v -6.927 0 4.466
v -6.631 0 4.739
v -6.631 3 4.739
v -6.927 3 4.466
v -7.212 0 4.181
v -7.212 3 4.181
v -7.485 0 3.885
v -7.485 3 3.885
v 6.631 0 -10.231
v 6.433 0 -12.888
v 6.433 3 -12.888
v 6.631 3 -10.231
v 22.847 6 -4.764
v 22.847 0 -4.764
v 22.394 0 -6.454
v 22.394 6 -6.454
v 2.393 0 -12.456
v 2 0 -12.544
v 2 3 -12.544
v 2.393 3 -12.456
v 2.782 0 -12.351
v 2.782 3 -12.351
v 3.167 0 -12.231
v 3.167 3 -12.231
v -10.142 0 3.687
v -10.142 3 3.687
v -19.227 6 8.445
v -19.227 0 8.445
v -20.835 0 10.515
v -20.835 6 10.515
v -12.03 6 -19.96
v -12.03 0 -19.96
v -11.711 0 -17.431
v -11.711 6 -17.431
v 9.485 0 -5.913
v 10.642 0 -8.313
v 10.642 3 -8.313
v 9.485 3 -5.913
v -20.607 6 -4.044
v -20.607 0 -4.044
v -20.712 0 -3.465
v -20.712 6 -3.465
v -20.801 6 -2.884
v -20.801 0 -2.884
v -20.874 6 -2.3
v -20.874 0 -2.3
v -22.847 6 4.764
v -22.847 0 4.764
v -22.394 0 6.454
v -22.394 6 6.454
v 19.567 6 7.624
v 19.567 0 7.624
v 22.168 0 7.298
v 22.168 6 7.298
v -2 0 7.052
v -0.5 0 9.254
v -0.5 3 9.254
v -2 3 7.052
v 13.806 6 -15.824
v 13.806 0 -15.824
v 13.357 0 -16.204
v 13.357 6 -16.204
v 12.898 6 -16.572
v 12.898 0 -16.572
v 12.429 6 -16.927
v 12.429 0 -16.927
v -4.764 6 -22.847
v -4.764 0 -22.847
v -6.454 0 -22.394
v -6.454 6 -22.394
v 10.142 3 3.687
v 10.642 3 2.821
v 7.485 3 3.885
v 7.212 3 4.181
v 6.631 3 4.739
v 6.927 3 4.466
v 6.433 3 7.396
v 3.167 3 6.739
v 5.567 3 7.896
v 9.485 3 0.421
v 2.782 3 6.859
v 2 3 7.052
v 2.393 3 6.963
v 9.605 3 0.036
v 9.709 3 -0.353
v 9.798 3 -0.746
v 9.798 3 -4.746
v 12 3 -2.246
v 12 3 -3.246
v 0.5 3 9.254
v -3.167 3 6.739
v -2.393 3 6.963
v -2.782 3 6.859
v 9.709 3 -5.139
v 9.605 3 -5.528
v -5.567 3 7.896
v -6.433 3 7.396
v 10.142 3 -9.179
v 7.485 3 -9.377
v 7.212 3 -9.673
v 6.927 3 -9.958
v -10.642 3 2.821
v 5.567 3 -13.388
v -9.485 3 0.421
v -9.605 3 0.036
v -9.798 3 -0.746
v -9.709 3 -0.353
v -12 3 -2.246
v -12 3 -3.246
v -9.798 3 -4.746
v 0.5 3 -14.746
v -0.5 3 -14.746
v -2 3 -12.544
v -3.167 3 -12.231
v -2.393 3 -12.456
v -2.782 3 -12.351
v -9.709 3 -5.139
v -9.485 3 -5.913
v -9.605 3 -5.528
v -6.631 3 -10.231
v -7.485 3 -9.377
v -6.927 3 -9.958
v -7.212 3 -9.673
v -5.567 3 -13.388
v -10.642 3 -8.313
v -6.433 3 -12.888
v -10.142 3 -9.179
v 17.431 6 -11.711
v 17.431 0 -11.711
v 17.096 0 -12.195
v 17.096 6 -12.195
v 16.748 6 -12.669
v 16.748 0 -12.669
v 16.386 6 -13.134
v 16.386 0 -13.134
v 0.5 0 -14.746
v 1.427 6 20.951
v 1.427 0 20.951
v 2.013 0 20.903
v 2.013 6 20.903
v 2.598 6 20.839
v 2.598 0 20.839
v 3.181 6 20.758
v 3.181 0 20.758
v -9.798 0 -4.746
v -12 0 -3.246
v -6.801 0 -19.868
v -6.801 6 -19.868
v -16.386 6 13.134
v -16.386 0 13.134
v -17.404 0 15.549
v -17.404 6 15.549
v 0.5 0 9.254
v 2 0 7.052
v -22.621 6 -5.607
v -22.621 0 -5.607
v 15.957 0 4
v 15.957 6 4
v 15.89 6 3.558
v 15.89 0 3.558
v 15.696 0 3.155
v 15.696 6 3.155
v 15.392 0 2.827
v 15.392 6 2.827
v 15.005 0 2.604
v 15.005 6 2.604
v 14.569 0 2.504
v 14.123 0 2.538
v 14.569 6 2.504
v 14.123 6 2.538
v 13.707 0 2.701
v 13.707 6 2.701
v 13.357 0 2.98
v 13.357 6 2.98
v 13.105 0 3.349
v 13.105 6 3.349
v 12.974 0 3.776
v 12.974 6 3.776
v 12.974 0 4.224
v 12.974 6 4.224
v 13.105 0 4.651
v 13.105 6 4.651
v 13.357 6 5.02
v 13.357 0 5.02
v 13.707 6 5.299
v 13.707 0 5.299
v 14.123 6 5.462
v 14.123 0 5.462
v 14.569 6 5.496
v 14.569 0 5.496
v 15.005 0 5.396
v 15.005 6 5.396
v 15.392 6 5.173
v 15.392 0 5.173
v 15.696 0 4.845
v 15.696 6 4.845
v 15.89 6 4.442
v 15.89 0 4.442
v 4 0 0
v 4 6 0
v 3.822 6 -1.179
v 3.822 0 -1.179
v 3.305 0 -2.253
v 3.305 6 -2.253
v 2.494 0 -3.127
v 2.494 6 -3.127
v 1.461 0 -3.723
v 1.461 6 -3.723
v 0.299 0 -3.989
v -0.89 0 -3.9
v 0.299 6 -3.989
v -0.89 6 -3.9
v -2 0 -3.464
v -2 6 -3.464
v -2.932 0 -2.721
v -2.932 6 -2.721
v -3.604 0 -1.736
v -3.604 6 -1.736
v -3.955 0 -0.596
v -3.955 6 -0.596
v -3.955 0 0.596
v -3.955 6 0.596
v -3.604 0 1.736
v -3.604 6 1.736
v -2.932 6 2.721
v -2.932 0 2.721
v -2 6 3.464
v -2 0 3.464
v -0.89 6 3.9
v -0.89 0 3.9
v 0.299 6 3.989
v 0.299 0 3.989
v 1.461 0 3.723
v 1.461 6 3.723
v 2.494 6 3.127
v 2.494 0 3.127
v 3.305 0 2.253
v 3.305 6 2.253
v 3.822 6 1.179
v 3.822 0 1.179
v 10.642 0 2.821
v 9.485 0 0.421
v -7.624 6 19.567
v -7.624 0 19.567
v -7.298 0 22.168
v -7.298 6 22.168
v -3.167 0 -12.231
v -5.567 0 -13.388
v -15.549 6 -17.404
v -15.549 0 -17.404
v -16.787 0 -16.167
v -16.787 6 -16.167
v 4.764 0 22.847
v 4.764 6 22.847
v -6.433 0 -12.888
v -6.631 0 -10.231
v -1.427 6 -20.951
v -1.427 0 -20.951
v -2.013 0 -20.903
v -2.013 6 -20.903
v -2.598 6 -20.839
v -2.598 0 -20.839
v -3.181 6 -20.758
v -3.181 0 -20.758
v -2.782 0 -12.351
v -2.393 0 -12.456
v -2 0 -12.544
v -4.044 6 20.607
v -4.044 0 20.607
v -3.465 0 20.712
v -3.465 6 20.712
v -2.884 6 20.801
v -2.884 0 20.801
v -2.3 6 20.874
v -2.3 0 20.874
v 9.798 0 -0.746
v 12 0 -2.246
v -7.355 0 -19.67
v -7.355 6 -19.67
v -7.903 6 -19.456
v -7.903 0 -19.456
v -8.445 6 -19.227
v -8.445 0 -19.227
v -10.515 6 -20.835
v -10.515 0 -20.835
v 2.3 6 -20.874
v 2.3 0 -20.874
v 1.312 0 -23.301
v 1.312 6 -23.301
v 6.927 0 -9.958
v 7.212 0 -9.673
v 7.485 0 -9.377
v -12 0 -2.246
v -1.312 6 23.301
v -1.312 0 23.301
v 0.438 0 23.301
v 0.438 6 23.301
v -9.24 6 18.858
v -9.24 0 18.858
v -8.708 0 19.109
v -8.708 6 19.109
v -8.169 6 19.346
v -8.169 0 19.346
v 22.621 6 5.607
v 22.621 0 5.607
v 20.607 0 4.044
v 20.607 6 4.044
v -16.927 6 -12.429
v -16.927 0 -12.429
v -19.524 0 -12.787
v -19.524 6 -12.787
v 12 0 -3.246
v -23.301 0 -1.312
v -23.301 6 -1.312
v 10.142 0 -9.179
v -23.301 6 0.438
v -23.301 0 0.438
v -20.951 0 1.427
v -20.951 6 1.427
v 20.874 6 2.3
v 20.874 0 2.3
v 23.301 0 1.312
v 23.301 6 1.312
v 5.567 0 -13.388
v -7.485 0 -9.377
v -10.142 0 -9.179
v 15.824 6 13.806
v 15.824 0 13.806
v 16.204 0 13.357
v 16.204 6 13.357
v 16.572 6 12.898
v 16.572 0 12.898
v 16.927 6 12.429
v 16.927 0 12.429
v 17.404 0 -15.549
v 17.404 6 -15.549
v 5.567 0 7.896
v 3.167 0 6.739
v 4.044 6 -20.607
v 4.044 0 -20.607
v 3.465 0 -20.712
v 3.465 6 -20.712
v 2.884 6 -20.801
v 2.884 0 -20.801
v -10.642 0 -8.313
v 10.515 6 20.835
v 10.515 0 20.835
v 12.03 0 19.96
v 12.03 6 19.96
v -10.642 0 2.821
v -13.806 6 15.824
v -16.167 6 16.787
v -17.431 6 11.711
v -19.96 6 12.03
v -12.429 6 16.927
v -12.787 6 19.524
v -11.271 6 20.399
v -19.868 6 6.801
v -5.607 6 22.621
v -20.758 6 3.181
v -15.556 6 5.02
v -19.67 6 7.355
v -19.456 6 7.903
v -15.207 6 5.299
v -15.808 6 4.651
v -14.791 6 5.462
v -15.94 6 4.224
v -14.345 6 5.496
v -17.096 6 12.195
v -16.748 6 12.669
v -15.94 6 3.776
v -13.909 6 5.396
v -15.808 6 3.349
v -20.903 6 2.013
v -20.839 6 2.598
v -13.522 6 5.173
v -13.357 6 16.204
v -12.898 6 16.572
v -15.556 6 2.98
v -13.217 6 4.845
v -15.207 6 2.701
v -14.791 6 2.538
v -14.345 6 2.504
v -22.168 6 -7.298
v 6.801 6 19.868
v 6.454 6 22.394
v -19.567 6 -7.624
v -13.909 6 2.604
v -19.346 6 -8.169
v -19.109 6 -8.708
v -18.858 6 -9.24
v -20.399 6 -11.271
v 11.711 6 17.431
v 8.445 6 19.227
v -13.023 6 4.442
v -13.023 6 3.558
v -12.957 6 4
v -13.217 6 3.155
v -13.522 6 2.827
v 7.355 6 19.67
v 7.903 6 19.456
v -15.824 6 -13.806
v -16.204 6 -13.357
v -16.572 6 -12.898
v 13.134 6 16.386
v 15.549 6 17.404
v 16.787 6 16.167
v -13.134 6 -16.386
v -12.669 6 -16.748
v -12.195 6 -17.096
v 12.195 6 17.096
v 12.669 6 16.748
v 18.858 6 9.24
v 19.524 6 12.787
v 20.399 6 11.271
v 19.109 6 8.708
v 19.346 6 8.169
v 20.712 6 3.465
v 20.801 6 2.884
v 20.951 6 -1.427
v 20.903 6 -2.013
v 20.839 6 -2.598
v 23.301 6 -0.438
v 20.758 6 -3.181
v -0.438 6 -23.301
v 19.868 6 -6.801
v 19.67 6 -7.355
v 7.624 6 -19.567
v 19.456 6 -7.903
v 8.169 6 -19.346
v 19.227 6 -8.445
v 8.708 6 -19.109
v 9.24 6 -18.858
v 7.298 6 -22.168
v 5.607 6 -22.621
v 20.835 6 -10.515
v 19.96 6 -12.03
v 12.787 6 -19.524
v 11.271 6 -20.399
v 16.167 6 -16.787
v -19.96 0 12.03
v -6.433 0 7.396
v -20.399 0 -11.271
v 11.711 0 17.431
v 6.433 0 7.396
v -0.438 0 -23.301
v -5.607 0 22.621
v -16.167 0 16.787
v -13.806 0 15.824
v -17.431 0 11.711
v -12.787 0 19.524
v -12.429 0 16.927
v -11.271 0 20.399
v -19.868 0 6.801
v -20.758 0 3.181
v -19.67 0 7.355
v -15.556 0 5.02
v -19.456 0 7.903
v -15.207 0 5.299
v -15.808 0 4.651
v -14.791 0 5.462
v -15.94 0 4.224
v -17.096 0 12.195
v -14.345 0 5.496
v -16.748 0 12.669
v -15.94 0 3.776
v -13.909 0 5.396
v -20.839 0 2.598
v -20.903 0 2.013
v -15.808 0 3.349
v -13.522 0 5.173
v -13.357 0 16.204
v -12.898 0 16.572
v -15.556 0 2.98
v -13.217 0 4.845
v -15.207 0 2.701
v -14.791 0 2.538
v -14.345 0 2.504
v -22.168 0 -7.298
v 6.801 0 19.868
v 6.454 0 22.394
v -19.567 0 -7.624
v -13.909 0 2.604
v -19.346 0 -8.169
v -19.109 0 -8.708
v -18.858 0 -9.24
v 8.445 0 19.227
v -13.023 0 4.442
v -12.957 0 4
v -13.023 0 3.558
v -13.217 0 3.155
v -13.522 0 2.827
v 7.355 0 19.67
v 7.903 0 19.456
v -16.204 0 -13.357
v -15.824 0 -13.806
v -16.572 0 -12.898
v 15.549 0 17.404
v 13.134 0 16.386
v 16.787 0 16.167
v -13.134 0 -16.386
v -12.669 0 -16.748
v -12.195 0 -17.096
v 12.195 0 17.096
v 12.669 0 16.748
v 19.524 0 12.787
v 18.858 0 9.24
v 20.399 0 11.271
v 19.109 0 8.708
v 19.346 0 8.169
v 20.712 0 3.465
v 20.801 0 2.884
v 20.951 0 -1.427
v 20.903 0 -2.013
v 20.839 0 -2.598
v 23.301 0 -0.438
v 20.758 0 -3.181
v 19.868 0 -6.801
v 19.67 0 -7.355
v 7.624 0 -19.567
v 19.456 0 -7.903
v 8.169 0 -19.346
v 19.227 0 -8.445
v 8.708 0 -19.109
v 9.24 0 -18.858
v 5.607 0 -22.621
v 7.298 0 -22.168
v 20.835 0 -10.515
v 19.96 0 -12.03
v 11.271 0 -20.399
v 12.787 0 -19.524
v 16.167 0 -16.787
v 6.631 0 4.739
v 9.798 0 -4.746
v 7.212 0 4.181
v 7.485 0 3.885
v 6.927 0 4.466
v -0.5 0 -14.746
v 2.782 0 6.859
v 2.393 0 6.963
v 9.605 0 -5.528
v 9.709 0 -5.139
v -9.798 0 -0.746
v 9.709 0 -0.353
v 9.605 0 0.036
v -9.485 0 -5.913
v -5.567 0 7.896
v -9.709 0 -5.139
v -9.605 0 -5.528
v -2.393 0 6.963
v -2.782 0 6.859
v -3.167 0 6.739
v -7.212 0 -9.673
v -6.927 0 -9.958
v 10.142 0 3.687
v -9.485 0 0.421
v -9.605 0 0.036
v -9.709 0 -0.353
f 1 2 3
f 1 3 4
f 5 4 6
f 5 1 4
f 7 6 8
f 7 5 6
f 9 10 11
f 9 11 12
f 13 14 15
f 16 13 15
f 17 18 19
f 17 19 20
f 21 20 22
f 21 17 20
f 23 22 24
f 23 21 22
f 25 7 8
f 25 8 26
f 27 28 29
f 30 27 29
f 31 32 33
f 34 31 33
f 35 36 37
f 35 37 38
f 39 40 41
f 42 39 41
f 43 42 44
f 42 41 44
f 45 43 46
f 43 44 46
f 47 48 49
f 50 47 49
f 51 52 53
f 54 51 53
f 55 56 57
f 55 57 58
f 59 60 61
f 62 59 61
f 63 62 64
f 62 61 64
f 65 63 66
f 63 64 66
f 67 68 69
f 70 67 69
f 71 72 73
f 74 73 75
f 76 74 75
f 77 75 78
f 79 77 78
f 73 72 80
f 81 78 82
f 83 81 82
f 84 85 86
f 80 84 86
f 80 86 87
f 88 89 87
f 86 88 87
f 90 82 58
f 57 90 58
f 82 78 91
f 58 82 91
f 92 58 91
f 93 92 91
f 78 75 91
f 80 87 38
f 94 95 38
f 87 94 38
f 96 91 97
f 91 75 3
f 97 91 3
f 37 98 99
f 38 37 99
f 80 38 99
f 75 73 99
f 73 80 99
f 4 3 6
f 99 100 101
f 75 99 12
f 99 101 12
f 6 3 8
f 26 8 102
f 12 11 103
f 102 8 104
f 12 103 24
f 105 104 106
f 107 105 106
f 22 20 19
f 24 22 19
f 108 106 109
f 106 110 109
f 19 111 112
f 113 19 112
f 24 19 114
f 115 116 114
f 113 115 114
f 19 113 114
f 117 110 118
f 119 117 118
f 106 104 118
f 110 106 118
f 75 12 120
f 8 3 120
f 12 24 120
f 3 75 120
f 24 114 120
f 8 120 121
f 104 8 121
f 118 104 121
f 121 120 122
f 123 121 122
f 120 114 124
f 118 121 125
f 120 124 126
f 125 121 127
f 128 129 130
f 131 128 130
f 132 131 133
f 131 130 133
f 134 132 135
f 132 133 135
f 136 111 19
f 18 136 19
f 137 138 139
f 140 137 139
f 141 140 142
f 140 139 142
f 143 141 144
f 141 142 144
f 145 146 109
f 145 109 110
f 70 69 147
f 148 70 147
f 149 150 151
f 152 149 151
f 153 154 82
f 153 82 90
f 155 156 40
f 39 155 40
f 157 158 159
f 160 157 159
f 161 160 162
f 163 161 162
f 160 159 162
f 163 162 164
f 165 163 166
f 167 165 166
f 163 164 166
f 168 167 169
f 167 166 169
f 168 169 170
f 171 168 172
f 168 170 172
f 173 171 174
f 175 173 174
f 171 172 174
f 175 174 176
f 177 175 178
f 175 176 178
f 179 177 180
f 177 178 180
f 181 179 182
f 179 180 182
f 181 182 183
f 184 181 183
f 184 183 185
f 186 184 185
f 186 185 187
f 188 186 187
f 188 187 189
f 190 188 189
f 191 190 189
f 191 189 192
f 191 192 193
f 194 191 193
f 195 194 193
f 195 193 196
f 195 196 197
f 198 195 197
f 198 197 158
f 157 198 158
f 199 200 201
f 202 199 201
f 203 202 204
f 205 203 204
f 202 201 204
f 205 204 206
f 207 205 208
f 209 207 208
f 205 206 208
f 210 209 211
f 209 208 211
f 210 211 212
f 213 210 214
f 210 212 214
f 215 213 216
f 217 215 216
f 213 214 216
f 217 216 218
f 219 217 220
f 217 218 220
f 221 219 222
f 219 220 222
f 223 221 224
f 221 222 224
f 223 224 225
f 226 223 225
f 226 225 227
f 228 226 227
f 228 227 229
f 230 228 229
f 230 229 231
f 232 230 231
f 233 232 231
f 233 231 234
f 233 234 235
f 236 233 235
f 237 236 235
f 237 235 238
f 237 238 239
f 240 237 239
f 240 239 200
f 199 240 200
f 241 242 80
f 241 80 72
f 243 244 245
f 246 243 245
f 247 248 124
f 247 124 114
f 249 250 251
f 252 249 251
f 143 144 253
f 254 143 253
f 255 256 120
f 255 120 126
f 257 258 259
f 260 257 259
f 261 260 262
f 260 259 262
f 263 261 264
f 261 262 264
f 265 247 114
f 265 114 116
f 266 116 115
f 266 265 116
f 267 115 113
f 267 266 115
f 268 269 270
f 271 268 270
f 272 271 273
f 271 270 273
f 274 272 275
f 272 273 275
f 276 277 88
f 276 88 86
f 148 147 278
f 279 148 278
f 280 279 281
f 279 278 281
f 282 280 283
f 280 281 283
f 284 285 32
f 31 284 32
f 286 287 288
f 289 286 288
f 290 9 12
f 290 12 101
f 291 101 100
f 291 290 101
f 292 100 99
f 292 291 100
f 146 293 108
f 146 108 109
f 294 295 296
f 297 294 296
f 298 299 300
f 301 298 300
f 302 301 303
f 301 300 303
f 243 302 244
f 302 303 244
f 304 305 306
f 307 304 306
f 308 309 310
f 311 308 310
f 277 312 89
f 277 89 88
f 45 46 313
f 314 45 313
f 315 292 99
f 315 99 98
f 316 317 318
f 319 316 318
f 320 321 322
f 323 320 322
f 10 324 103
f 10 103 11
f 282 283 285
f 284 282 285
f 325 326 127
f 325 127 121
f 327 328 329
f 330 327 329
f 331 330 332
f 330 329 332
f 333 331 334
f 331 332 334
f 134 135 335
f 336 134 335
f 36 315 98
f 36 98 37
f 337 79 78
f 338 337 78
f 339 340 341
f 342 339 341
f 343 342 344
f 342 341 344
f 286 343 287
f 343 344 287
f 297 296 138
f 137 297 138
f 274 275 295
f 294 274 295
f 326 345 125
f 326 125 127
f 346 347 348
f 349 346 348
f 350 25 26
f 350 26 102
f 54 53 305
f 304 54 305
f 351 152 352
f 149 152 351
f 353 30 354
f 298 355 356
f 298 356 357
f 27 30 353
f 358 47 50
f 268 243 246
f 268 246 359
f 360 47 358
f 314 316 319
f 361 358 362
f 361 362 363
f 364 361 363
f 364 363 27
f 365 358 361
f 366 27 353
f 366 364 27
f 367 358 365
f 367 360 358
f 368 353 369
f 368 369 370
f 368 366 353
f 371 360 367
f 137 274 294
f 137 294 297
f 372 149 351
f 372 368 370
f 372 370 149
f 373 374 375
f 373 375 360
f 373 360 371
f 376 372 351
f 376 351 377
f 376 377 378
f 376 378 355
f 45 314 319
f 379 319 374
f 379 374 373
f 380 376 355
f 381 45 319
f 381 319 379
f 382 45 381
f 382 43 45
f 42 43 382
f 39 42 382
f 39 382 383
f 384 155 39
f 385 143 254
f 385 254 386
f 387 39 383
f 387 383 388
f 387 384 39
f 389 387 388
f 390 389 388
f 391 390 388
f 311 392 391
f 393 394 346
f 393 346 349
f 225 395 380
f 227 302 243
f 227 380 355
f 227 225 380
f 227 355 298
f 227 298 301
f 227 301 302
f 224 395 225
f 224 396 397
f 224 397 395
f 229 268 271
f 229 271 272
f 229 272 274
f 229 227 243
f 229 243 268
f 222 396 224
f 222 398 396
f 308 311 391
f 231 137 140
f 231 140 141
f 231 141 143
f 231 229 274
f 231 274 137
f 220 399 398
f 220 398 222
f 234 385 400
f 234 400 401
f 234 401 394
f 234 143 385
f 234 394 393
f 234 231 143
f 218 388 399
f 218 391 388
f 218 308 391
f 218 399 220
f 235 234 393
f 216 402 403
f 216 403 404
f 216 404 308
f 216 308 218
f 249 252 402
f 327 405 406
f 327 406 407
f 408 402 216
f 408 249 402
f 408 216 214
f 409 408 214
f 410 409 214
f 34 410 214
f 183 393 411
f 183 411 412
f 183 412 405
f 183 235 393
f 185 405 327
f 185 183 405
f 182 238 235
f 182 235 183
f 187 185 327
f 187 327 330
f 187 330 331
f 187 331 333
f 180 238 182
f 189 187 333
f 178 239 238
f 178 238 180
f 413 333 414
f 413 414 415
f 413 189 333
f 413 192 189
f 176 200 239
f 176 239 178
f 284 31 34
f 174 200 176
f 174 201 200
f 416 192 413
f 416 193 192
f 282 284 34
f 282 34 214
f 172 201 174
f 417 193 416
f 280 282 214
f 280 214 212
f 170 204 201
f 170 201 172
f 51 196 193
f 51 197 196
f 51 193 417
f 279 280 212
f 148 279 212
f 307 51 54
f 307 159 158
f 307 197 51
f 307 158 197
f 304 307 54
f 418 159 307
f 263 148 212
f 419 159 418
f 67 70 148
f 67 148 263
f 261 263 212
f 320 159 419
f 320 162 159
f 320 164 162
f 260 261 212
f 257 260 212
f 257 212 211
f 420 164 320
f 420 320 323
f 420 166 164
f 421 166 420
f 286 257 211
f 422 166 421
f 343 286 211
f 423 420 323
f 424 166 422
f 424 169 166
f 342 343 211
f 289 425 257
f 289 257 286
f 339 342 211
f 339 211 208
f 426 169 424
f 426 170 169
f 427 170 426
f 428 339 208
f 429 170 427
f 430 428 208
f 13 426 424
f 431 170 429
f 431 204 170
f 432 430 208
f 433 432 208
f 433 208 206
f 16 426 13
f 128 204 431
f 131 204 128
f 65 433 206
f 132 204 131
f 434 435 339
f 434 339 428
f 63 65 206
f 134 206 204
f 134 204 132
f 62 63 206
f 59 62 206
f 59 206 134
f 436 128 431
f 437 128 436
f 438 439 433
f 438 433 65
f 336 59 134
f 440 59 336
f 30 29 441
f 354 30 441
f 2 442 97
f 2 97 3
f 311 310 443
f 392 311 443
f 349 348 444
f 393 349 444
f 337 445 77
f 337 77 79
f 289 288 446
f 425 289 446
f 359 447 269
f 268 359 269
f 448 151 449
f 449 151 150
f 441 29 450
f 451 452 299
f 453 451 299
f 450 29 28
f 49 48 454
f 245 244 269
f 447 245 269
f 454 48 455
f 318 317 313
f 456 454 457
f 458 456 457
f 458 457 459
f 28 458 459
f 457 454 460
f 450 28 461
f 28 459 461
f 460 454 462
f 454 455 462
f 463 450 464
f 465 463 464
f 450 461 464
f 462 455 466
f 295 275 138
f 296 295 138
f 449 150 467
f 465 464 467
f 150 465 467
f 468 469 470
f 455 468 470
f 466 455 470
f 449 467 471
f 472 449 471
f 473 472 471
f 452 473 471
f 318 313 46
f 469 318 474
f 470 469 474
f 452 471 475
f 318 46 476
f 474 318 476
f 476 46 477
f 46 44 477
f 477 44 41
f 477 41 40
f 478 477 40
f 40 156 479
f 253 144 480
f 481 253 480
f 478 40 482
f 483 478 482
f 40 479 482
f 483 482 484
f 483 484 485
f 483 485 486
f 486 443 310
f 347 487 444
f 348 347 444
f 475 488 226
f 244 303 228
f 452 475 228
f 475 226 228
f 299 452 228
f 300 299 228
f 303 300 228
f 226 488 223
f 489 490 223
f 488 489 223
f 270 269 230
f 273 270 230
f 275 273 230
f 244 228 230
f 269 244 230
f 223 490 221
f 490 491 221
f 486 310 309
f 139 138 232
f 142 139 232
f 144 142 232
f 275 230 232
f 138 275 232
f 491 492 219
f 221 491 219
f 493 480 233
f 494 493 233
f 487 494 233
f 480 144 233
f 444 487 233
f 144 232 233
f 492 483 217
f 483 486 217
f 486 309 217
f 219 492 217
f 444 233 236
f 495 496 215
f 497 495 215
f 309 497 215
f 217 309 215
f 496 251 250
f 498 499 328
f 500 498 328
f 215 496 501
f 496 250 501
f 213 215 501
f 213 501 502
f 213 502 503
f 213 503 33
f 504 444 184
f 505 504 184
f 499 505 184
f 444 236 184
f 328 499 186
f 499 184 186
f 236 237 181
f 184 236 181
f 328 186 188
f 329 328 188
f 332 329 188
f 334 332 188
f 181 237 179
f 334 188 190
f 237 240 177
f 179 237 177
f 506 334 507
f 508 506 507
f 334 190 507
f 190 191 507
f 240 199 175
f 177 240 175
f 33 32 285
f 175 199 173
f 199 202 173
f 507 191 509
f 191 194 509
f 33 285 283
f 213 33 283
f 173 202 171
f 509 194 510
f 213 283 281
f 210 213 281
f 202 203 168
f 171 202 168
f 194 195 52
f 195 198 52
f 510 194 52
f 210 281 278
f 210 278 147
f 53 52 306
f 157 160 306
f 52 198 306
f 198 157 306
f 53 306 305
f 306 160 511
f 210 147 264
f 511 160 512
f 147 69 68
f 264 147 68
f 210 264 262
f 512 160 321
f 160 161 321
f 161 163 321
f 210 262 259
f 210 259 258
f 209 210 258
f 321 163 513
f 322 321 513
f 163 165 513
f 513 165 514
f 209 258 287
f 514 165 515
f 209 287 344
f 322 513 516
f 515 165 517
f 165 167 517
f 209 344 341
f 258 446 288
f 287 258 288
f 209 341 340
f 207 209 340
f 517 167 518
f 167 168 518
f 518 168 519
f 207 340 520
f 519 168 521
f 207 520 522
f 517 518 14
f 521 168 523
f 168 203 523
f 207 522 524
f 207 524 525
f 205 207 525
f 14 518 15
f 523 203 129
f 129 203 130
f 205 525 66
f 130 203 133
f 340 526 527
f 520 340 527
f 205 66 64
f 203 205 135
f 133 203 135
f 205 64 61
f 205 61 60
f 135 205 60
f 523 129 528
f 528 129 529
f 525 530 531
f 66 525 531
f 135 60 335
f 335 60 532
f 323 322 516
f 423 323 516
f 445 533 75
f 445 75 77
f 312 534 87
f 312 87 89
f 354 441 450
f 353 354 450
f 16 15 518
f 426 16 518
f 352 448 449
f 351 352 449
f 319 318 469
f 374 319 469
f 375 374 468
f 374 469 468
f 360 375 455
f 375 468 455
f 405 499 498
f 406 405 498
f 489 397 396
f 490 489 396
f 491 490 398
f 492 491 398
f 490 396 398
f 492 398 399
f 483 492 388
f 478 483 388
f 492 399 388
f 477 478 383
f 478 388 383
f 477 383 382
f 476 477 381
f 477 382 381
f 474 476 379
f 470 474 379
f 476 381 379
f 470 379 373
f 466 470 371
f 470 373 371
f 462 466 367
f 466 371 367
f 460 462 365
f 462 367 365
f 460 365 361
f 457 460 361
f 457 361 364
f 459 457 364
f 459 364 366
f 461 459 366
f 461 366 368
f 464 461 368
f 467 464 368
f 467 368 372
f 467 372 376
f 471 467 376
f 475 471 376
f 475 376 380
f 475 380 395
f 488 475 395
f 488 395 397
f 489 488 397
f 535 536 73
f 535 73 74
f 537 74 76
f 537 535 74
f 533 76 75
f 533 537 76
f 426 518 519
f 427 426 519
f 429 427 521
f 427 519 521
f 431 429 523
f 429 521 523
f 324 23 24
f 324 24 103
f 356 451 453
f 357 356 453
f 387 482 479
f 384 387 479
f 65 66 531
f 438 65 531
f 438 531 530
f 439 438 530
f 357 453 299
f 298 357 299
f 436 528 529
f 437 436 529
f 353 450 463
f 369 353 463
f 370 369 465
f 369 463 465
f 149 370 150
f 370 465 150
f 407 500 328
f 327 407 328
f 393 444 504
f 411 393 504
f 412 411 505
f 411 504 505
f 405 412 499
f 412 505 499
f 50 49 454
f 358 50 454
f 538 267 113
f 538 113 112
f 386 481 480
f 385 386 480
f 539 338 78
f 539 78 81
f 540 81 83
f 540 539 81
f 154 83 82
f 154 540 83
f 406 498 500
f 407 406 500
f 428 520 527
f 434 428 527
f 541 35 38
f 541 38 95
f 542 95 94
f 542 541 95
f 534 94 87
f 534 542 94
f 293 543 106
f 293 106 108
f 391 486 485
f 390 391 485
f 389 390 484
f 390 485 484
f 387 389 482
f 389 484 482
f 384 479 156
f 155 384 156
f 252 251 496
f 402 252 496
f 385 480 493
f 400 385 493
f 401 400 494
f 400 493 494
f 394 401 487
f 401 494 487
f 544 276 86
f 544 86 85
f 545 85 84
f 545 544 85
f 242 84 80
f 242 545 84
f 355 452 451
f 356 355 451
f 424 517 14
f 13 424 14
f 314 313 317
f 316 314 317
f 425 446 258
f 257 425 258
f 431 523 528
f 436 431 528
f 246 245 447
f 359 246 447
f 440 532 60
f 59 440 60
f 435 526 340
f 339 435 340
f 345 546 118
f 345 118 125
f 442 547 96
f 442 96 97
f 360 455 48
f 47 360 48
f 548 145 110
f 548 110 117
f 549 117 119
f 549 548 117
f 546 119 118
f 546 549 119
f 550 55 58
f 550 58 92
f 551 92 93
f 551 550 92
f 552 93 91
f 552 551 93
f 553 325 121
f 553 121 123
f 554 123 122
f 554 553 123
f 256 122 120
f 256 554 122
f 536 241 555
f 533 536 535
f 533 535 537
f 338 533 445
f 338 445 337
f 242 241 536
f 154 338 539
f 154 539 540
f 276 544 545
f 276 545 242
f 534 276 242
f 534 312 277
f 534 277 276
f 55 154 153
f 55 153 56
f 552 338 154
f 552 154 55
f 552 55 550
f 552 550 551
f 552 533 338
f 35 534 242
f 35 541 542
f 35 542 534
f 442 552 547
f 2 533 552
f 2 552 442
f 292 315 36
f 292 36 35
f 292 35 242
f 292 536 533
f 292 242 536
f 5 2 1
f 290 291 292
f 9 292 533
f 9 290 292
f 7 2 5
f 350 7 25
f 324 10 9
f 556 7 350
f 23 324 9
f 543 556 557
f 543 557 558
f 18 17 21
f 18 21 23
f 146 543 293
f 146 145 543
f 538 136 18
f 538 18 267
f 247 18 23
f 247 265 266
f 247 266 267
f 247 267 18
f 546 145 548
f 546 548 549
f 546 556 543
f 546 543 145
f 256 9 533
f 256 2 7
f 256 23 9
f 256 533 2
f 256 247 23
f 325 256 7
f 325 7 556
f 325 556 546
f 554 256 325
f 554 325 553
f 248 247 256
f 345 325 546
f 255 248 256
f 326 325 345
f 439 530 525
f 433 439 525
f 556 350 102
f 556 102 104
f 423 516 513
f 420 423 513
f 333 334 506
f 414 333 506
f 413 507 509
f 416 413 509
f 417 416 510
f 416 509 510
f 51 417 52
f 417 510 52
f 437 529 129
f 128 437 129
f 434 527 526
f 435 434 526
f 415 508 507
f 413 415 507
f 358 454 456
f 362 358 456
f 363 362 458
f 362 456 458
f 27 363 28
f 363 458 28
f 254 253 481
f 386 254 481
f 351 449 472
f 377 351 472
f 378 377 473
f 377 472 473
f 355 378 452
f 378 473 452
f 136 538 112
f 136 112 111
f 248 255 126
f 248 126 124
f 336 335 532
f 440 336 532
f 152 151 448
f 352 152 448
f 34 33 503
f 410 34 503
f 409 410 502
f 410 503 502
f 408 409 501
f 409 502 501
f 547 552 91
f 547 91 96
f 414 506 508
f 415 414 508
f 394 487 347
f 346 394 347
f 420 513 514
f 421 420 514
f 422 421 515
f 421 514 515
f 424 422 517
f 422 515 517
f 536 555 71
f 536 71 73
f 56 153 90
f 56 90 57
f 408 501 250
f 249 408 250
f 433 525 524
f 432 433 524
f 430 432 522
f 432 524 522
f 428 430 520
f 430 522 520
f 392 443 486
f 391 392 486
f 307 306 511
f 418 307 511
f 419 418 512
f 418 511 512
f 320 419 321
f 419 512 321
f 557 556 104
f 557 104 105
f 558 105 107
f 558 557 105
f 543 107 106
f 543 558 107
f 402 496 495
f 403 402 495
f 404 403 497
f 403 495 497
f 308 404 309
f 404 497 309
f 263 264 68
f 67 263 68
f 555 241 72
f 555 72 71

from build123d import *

# Parameters (mm, degrees)
BOSS_EXTRUDE5_DEPTH = 6
BOSS_EXTRUDE6_DEPTH = 3
SKETCH4_R           = 4
CUT_EXTRUDE1_DEPTH  = 10
SKETCH5_R           = 1.5
CUT_EXTRUDE2_DEPTH  = 7


with BuildPart() as part:
    # Sketch3 → Boss-Extrude5 (new body)
    with BuildSketch(Plane(origin=(0, 0, 0), x_dir=(1, 0, 0), z_dir=(0, 1, 0))):
        with BuildLine():
            Line((23.301465589, -1.311541929), (23.301465589, 0.438458071))
            Line((23.301465589, 0.438458071), (20.951465589, 1.426916143))
            ThreePointArc((20.951465589, 1.426916143), (20.873013262, 2.30593091), (20.757698449, 3.180873321))
            Line((20.757698449, 3.180873321), (22.846939432, 4.764010852))
            Line((22.846939432, 4.764010852), (22.394006103, 6.454381048))
            Line((22.394006103, 6.454381048), (19.868248637, 6.800933471))
            ThreePointArc((19.868248637, 6.800933471), (19.564963746, 7.629691581), (19.227126431, 8.444975382))
            Line((19.227126431, 8.444975382), (20.83543211, 10.514904166))
            Line((20.83543211, 10.514904166), (19.96043211, 12.030448623))
            Line((19.96043211, 12.030448623), (17.431043375, 11.711478423))
            ThreePointArc((17.431043375, 11.711478423), (16.923594283, 12.433501379), (16.386257521, 13.133566327))
            Line((16.386257521, 13.133566327), (17.404024521, 15.549224138))
            Line((17.404024521, 15.549224138), (16.166587654, 16.786661005))
            Line((16.166587654, 16.786661005), (13.805941313, 15.823905474))
            ThreePointArc((13.805941313, 15.823905474), (13.128909838, 16.389988605), (12.42869224, 16.927126431))
            Line((12.42869224, 16.927126431), (12.786561423, 19.523890181))
            Line((12.786561423, 19.523890181), (11.271016966, 20.398890181))
            Line((11.271016966, 20.398890181), (9.239987166, 18.857959518))
            ThreePointArc((9.239987166, 18.857959518), (8.439511883, 19.229525194), (7.624132122, 19.567130842))
            Line((7.624132122, 19.567130842), (7.297715294, 22.168035373))
            Line((7.297715294, 22.168035373), (5.607345098, 22.620968702))
            Line((5.607345098, 22.620968702), (4.044343163, 20.606874784))
            ThreePointArc((4.044343163, 20.606874784), (3.174975141, 20.758601419), (2.3, 20.873667622))
            Line((2.3, 20.873667622), (1.311541929, 23.301465589))
            Line((1.311541929, 23.301465589), (-0.438458071, 23.301465589))
            Line((-0.438458071, 23.301465589), (-1.426916143, 20.951465589))
            ThreePointArc((-1.426916143, 20.951465589), (-2.30593091, 20.873013262), (-3.180873321, 20.757698449))
            Line((-3.180873321, 20.757698449), (-4.764010852, 22.846939432))
            Line((-4.764010852, 22.846939432), (-6.454381048, 22.394006103))
            Line((-6.454381048, 22.394006103), (-6.800933471, 19.868248637))
            ThreePointArc((-6.800933471, 19.868248637), (-7.629691581, 19.564963746), (-8.444975382, 19.227126431))
            Line((-8.444975382, 19.227126431), (-10.514904166, 20.83543211))
            Line((-10.514904166, 20.83543211), (-12.030448623, 19.96043211))
            Line((-12.030448623, 19.96043211), (-11.711478423, 17.431043375))
            ThreePointArc((-11.711478423, 17.431043375), (-12.433501379, 16.923594283), (-13.133566327, 16.386257521))
            Line((-13.133566327, 16.386257521), (-15.549224138, 17.404024521))
            Line((-15.549224138, 17.404024521), (-16.786661005, 16.166587654))
            Line((-16.786661005, 16.166587654), (-15.823905474, 13.805941313))
            ThreePointArc((-15.823905474, 13.805941313), (-16.389988605, 13.128909838), (-16.927126431, 12.42869224))
            Line((-16.927126431, 12.42869224), (-19.523890181, 12.786561423))
            Line((-19.523890181, 12.786561423), (-20.398890181, 11.271016966))
            Line((-20.398890181, 11.271016966), (-18.857959518, 9.239987166))
            ThreePointArc((-18.857959518, 9.239987166), (-19.229525194, 8.439511883), (-19.567130842, 7.624132122))
            Line((-19.567130842, 7.624132122), (-22.168035373, 7.297715294))
            Line((-22.168035373, 7.297715294), (-22.620968702, 5.607345098))
            Line((-22.620968702, 5.607345098), (-20.606874784, 4.044343163))
            ThreePointArc((-20.606874784, 4.044343163), (-20.758601419, 3.174975141), (-20.873667622, 2.3))
            Line((-20.873667622, 2.3), (-23.301465589, 1.311541929))
            Line((-23.301465589, 1.311541929), (-23.301465589, -0.438458071))
            Line((-23.301465589, -0.438458071), (-20.951465589, -1.426916143))
            ThreePointArc((-20.951465589, -1.426916143), (-20.873013262, -2.30593091), (-20.757698449, -3.180873321))
            Line((-20.757698449, -3.180873321), (-22.846939432, -4.764010852))
            Line((-22.846939432, -4.764010852), (-22.394006103, -6.454381048))
            Line((-22.394006103, -6.454381048), (-19.868248637, -6.800933471))
            ThreePointArc((-19.868248637, -6.800933471), (-19.564963746, -7.629691581), (-19.227126431, -8.444975382))
            Line((-19.227126431, -8.444975382), (-20.83543211, -10.514904166))
            Line((-20.83543211, -10.514904166), (-19.96043211, -12.030448623))
            Line((-19.96043211, -12.030448623), (-17.431043375, -11.711478423))
            ThreePointArc((-17.431043375, -11.711478423), (-16.923594283, -12.433501379), (-16.386257521, -13.133566327))
            Line((-16.386257521, -13.133566327), (-17.404024521, -15.549224138))
            Line((-17.404024521, -15.549224138), (-16.166587654, -16.786661005))
            Line((-16.166587654, -16.786661005), (-13.805941313, -15.823905474))
            ThreePointArc((-13.805941313, -15.823905474), (-13.128909838, -16.389988605), (-12.42869224, -16.927126431))
            Line((-12.42869224, -16.927126431), (-12.786561423, -19.523890181))
            Line((-12.786561423, -19.523890181), (-11.271016966, -20.398890181))
            Line((-11.271016966, -20.398890181), (-9.239987166, -18.857959518))
            ThreePointArc((-9.239987166, -18.857959518), (-8.439511883, -19.229525194), (-7.624132122, -19.567130842))
            Line((-7.624132122, -19.567130842), (-7.297715294, -22.168035373))
            Line((-7.297715294, -22.168035373), (-5.607345098, -22.620968702))
            Line((-5.607345098, -22.620968702), (-4.044343163, -20.606874784))
            ThreePointArc((-4.044343163, -20.606874784), (-3.174975141, -20.758601419), (-2.3, -20.873667622))
            Line((-2.3, -20.873667622), (-1.311541929, -23.301465589))
            Line((-1.311541929, -23.301465589), (0.438458071, -23.301465589))
            Line((0.438458071, -23.301465589), (1.426916143, -20.951465589))
            ThreePointArc((1.426916143, -20.951465589), (2.30593091, -20.873013262), (3.180873321, -20.757698449))
            Line((3.180873321, -20.757698449), (4.764010852, -22.846939432))
            Line((4.764010852, -22.846939432), (6.454381048, -22.394006103))
            Line((6.454381048, -22.394006103), (6.800933471, -19.868248637))
            ThreePointArc((6.800933471, -19.868248637), (7.629691581, -19.564963746), (8.444975382, -19.227126431))
            Line((8.444975382, -19.227126431), (10.514904166, -20.83543211))
            Line((10.514904166, -20.83543211), (12.030448623, -19.96043211))
            Line((12.030448623, -19.96043211), (11.711478423, -17.431043375))
            ThreePointArc((11.711478423, -17.431043375), (12.433501379, -16.923594283), (13.133566327, -16.386257521))
            Line((13.133566327, -16.386257521), (15.549224138, -17.404024521))
            Line((15.549224138, -17.404024521), (16.786661005, -16.166587654))
            Line((16.786661005, -16.166587654), (15.823905474, -13.805941313))
            ThreePointArc((15.823905474, -13.805941313), (16.389988605, -13.128909838), (16.927126431, -12.42869224))
            Line((16.927126431, -12.42869224), (19.523890181, -12.786561423))
            Line((19.523890181, -12.786561423), (20.398890181, -11.271016966))
            Line((20.398890181, -11.271016966), (18.857959518, -9.239987166))
            ThreePointArc((18.857959518, -9.239987166), (19.229525194, -8.439511883), (19.567130842, -7.624132122))
            Line((19.567130842, -7.624132122), (22.168035373, -7.297715294))
            Line((22.168035373, -7.297715294), (22.620968702, -5.607345098))
            Line((22.620968702, -5.607345098), (20.606874784, -4.044343163))
            ThreePointArc((20.606874784, -4.044343163), (20.758601419, -3.174975141), (20.873667622, -2.3))
            Line((20.873667622, -2.3), (23.301465589, -1.311541929))
        make_face()
    extrude(amount=BOSS_EXTRUDE5_DEPTH)

    # Sketch4 → Cut-Extrude1 (cut)
    with BuildSketch(Plane(origin=(0, 6, 0), x_dir=(1, 0, 0), z_dir=(0, 1, 0))):
        Circle(SKETCH4_R)
    extrude(amount=-CUT_EXTRUDE1_DEPTH, mode=Mode.SUBTRACT)

    # Sketch5 → Cut-Extrude2 (cut, through all)
    with BuildSketch(Plane(origin=(0, 6, 0), x_dir=(1, 0, 0), z_dir=(0, 1, 0))):
        with Locations((-14.456832295, -4)):
            Circle(SKETCH5_R)
        with Locations((14.456832295, -4)):
            Circle(SKETCH5_R)
    extrude(amount=-CUT_EXTRUDE2_DEPTH, mode=Mode.SUBTRACT)


with BuildPart() as body_2:
    # Sketch1 → Boss-Extrude6 (new body)
    with BuildSketch(Plane(origin=(0, 0, 0), x_dir=(1, 0, 0), z_dir=(0, 1, 0))):
        with BuildLine():
            Line((-0.5, 14.746169466), (0.5, 14.746169466))
            Line((0.5, 14.746169466), (2, 12.544128437))
            ThreePointArc((2, 12.544128437), (2.588190451, 12.405427729), (3.166928678, 12.23145084))
            Line((3.166928678, 12.23145084), (5.566987298, 13.388474311))
            Line((5.566987298, 13.388474311), (6.433012702, 12.888474311))
            Line((6.433012702, 12.888474311), (6.631030293, 10.23145084))
            ThreePointArc((6.631030293, 10.23145084), (7.071067812, 9.817237278), (7.485281374, 9.377199759))
            Line((7.485281374, 9.377199759), (10.142304845, 9.179182168))
            Line((10.142304845, 9.179182168), (10.642304845, 8.313156764))
            Line((10.642304845, 8.313156764), (9.485281374, 5.913098144))
            ThreePointArc((9.485281374, 5.913098144), (9.659258263, 5.334359917), (9.797958971, 4.746169466))
            Line((9.797958971, 4.746169466), (12, 3.246169466))
            Line((12, 3.246169466), (12, 2.246169466))
            Line((12, 2.246169466), (9.797958971, 0.746169466))
            ThreePointArc((9.797958971, 0.746169466), (9.659258263, 0.157979015), (9.485281374, -0.420759212))
            Line((9.485281374, -0.420759212), (10.642304845, -2.820817832))
            Line((10.642304845, -2.820817832), (10.142304845, -3.686843236))
            Line((10.142304845, -3.686843236), (7.485281374, -3.884860827))
            ThreePointArc((7.485281374, -3.884860827), (7.071067812, -4.324898346), (6.631030293, -4.739111908))
            Line((6.631030293, -4.739111908), (6.433012702, -7.39613538))
            Line((6.433012702, -7.39613538), (5.566987298, -7.89613538))
            Line((5.566987298, -7.89613538), (3.166928678, -6.739111908))
            ThreePointArc((3.166928678, -6.739111908), (2.588190451, -6.913088797), (2, -7.051789505))
            Line((2, -7.051789505), (0.5, -9.253830534))
            Line((0.5, -9.253830534), (-0.5, -9.253830534))
            Line((-0.5, -9.253830534), (-2, -7.051789505))
            ThreePointArc((-2, -7.051789505), (-2.588190451, -6.913088797), (-3.166928678, -6.739111908))
            Line((-3.166928678, -6.739111908), (-5.566987298, -7.89613538))
            Line((-5.566987298, -7.89613538), (-6.433012702, -7.39613538))
            Line((-6.433012702, -7.39613538), (-6.631030293, -4.739111908))
            ThreePointArc((-6.631030293, -4.739111908), (-7.071067812, -4.324898346), (-7.485281374, -3.884860827))
            Line((-7.485281374, -3.884860827), (-10.142304845, -3.686843236))
            Line((-10.142304845, -3.686843236), (-10.642304845, -2.820817832))
            Line((-10.642304845, -2.820817832), (-9.485281374, -0.420759212))
            ThreePointArc((-9.485281374, -0.420759212), (-9.659258263, 0.157979015), (-9.797958971, 0.746169466))
            Line((-9.797958971, 0.746169466), (-12, 2.246169466))
            Line((-12, 2.246169466), (-12, 3.246169466))
            Line((-12, 3.246169466), (-9.797958971, 4.746169466))
            ThreePointArc((-9.797958971, 4.746169466), (-9.659258263, 5.334359917), (-9.485281374, 5.913098144))
            Line((-9.485281374, 5.913098144), (-10.642304845, 8.313156764))
            Line((-10.642304845, 8.313156764), (-10.142304845, 9.179182168))
            Line((-10.142304845, 9.179182168), (-7.485281374, 9.377199759))
            ThreePointArc((-7.485281374, 9.377199759), (-7.071067812, 9.817237278), (-6.631030293, 10.23145084))
            Line((-6.631030293, 10.23145084), (-6.433012702, 12.888474311))
            Line((-6.433012702, 12.888474311), (-5.566987298, 13.388474311))
            Line((-5.566987298, 13.388474311), (-3.166928678, 12.23145084))
            ThreePointArc((-3.166928678, 12.23145084), (-2.588190451, 12.405427729), (-2, 12.544128437))
            Line((-2, 12.544128437), (-0.5, 14.746169466))
        make_face()
    extrude(amount=BOSS_EXTRUDE6_DEPTH)


solid = Compound([part.part, body_2.part])
